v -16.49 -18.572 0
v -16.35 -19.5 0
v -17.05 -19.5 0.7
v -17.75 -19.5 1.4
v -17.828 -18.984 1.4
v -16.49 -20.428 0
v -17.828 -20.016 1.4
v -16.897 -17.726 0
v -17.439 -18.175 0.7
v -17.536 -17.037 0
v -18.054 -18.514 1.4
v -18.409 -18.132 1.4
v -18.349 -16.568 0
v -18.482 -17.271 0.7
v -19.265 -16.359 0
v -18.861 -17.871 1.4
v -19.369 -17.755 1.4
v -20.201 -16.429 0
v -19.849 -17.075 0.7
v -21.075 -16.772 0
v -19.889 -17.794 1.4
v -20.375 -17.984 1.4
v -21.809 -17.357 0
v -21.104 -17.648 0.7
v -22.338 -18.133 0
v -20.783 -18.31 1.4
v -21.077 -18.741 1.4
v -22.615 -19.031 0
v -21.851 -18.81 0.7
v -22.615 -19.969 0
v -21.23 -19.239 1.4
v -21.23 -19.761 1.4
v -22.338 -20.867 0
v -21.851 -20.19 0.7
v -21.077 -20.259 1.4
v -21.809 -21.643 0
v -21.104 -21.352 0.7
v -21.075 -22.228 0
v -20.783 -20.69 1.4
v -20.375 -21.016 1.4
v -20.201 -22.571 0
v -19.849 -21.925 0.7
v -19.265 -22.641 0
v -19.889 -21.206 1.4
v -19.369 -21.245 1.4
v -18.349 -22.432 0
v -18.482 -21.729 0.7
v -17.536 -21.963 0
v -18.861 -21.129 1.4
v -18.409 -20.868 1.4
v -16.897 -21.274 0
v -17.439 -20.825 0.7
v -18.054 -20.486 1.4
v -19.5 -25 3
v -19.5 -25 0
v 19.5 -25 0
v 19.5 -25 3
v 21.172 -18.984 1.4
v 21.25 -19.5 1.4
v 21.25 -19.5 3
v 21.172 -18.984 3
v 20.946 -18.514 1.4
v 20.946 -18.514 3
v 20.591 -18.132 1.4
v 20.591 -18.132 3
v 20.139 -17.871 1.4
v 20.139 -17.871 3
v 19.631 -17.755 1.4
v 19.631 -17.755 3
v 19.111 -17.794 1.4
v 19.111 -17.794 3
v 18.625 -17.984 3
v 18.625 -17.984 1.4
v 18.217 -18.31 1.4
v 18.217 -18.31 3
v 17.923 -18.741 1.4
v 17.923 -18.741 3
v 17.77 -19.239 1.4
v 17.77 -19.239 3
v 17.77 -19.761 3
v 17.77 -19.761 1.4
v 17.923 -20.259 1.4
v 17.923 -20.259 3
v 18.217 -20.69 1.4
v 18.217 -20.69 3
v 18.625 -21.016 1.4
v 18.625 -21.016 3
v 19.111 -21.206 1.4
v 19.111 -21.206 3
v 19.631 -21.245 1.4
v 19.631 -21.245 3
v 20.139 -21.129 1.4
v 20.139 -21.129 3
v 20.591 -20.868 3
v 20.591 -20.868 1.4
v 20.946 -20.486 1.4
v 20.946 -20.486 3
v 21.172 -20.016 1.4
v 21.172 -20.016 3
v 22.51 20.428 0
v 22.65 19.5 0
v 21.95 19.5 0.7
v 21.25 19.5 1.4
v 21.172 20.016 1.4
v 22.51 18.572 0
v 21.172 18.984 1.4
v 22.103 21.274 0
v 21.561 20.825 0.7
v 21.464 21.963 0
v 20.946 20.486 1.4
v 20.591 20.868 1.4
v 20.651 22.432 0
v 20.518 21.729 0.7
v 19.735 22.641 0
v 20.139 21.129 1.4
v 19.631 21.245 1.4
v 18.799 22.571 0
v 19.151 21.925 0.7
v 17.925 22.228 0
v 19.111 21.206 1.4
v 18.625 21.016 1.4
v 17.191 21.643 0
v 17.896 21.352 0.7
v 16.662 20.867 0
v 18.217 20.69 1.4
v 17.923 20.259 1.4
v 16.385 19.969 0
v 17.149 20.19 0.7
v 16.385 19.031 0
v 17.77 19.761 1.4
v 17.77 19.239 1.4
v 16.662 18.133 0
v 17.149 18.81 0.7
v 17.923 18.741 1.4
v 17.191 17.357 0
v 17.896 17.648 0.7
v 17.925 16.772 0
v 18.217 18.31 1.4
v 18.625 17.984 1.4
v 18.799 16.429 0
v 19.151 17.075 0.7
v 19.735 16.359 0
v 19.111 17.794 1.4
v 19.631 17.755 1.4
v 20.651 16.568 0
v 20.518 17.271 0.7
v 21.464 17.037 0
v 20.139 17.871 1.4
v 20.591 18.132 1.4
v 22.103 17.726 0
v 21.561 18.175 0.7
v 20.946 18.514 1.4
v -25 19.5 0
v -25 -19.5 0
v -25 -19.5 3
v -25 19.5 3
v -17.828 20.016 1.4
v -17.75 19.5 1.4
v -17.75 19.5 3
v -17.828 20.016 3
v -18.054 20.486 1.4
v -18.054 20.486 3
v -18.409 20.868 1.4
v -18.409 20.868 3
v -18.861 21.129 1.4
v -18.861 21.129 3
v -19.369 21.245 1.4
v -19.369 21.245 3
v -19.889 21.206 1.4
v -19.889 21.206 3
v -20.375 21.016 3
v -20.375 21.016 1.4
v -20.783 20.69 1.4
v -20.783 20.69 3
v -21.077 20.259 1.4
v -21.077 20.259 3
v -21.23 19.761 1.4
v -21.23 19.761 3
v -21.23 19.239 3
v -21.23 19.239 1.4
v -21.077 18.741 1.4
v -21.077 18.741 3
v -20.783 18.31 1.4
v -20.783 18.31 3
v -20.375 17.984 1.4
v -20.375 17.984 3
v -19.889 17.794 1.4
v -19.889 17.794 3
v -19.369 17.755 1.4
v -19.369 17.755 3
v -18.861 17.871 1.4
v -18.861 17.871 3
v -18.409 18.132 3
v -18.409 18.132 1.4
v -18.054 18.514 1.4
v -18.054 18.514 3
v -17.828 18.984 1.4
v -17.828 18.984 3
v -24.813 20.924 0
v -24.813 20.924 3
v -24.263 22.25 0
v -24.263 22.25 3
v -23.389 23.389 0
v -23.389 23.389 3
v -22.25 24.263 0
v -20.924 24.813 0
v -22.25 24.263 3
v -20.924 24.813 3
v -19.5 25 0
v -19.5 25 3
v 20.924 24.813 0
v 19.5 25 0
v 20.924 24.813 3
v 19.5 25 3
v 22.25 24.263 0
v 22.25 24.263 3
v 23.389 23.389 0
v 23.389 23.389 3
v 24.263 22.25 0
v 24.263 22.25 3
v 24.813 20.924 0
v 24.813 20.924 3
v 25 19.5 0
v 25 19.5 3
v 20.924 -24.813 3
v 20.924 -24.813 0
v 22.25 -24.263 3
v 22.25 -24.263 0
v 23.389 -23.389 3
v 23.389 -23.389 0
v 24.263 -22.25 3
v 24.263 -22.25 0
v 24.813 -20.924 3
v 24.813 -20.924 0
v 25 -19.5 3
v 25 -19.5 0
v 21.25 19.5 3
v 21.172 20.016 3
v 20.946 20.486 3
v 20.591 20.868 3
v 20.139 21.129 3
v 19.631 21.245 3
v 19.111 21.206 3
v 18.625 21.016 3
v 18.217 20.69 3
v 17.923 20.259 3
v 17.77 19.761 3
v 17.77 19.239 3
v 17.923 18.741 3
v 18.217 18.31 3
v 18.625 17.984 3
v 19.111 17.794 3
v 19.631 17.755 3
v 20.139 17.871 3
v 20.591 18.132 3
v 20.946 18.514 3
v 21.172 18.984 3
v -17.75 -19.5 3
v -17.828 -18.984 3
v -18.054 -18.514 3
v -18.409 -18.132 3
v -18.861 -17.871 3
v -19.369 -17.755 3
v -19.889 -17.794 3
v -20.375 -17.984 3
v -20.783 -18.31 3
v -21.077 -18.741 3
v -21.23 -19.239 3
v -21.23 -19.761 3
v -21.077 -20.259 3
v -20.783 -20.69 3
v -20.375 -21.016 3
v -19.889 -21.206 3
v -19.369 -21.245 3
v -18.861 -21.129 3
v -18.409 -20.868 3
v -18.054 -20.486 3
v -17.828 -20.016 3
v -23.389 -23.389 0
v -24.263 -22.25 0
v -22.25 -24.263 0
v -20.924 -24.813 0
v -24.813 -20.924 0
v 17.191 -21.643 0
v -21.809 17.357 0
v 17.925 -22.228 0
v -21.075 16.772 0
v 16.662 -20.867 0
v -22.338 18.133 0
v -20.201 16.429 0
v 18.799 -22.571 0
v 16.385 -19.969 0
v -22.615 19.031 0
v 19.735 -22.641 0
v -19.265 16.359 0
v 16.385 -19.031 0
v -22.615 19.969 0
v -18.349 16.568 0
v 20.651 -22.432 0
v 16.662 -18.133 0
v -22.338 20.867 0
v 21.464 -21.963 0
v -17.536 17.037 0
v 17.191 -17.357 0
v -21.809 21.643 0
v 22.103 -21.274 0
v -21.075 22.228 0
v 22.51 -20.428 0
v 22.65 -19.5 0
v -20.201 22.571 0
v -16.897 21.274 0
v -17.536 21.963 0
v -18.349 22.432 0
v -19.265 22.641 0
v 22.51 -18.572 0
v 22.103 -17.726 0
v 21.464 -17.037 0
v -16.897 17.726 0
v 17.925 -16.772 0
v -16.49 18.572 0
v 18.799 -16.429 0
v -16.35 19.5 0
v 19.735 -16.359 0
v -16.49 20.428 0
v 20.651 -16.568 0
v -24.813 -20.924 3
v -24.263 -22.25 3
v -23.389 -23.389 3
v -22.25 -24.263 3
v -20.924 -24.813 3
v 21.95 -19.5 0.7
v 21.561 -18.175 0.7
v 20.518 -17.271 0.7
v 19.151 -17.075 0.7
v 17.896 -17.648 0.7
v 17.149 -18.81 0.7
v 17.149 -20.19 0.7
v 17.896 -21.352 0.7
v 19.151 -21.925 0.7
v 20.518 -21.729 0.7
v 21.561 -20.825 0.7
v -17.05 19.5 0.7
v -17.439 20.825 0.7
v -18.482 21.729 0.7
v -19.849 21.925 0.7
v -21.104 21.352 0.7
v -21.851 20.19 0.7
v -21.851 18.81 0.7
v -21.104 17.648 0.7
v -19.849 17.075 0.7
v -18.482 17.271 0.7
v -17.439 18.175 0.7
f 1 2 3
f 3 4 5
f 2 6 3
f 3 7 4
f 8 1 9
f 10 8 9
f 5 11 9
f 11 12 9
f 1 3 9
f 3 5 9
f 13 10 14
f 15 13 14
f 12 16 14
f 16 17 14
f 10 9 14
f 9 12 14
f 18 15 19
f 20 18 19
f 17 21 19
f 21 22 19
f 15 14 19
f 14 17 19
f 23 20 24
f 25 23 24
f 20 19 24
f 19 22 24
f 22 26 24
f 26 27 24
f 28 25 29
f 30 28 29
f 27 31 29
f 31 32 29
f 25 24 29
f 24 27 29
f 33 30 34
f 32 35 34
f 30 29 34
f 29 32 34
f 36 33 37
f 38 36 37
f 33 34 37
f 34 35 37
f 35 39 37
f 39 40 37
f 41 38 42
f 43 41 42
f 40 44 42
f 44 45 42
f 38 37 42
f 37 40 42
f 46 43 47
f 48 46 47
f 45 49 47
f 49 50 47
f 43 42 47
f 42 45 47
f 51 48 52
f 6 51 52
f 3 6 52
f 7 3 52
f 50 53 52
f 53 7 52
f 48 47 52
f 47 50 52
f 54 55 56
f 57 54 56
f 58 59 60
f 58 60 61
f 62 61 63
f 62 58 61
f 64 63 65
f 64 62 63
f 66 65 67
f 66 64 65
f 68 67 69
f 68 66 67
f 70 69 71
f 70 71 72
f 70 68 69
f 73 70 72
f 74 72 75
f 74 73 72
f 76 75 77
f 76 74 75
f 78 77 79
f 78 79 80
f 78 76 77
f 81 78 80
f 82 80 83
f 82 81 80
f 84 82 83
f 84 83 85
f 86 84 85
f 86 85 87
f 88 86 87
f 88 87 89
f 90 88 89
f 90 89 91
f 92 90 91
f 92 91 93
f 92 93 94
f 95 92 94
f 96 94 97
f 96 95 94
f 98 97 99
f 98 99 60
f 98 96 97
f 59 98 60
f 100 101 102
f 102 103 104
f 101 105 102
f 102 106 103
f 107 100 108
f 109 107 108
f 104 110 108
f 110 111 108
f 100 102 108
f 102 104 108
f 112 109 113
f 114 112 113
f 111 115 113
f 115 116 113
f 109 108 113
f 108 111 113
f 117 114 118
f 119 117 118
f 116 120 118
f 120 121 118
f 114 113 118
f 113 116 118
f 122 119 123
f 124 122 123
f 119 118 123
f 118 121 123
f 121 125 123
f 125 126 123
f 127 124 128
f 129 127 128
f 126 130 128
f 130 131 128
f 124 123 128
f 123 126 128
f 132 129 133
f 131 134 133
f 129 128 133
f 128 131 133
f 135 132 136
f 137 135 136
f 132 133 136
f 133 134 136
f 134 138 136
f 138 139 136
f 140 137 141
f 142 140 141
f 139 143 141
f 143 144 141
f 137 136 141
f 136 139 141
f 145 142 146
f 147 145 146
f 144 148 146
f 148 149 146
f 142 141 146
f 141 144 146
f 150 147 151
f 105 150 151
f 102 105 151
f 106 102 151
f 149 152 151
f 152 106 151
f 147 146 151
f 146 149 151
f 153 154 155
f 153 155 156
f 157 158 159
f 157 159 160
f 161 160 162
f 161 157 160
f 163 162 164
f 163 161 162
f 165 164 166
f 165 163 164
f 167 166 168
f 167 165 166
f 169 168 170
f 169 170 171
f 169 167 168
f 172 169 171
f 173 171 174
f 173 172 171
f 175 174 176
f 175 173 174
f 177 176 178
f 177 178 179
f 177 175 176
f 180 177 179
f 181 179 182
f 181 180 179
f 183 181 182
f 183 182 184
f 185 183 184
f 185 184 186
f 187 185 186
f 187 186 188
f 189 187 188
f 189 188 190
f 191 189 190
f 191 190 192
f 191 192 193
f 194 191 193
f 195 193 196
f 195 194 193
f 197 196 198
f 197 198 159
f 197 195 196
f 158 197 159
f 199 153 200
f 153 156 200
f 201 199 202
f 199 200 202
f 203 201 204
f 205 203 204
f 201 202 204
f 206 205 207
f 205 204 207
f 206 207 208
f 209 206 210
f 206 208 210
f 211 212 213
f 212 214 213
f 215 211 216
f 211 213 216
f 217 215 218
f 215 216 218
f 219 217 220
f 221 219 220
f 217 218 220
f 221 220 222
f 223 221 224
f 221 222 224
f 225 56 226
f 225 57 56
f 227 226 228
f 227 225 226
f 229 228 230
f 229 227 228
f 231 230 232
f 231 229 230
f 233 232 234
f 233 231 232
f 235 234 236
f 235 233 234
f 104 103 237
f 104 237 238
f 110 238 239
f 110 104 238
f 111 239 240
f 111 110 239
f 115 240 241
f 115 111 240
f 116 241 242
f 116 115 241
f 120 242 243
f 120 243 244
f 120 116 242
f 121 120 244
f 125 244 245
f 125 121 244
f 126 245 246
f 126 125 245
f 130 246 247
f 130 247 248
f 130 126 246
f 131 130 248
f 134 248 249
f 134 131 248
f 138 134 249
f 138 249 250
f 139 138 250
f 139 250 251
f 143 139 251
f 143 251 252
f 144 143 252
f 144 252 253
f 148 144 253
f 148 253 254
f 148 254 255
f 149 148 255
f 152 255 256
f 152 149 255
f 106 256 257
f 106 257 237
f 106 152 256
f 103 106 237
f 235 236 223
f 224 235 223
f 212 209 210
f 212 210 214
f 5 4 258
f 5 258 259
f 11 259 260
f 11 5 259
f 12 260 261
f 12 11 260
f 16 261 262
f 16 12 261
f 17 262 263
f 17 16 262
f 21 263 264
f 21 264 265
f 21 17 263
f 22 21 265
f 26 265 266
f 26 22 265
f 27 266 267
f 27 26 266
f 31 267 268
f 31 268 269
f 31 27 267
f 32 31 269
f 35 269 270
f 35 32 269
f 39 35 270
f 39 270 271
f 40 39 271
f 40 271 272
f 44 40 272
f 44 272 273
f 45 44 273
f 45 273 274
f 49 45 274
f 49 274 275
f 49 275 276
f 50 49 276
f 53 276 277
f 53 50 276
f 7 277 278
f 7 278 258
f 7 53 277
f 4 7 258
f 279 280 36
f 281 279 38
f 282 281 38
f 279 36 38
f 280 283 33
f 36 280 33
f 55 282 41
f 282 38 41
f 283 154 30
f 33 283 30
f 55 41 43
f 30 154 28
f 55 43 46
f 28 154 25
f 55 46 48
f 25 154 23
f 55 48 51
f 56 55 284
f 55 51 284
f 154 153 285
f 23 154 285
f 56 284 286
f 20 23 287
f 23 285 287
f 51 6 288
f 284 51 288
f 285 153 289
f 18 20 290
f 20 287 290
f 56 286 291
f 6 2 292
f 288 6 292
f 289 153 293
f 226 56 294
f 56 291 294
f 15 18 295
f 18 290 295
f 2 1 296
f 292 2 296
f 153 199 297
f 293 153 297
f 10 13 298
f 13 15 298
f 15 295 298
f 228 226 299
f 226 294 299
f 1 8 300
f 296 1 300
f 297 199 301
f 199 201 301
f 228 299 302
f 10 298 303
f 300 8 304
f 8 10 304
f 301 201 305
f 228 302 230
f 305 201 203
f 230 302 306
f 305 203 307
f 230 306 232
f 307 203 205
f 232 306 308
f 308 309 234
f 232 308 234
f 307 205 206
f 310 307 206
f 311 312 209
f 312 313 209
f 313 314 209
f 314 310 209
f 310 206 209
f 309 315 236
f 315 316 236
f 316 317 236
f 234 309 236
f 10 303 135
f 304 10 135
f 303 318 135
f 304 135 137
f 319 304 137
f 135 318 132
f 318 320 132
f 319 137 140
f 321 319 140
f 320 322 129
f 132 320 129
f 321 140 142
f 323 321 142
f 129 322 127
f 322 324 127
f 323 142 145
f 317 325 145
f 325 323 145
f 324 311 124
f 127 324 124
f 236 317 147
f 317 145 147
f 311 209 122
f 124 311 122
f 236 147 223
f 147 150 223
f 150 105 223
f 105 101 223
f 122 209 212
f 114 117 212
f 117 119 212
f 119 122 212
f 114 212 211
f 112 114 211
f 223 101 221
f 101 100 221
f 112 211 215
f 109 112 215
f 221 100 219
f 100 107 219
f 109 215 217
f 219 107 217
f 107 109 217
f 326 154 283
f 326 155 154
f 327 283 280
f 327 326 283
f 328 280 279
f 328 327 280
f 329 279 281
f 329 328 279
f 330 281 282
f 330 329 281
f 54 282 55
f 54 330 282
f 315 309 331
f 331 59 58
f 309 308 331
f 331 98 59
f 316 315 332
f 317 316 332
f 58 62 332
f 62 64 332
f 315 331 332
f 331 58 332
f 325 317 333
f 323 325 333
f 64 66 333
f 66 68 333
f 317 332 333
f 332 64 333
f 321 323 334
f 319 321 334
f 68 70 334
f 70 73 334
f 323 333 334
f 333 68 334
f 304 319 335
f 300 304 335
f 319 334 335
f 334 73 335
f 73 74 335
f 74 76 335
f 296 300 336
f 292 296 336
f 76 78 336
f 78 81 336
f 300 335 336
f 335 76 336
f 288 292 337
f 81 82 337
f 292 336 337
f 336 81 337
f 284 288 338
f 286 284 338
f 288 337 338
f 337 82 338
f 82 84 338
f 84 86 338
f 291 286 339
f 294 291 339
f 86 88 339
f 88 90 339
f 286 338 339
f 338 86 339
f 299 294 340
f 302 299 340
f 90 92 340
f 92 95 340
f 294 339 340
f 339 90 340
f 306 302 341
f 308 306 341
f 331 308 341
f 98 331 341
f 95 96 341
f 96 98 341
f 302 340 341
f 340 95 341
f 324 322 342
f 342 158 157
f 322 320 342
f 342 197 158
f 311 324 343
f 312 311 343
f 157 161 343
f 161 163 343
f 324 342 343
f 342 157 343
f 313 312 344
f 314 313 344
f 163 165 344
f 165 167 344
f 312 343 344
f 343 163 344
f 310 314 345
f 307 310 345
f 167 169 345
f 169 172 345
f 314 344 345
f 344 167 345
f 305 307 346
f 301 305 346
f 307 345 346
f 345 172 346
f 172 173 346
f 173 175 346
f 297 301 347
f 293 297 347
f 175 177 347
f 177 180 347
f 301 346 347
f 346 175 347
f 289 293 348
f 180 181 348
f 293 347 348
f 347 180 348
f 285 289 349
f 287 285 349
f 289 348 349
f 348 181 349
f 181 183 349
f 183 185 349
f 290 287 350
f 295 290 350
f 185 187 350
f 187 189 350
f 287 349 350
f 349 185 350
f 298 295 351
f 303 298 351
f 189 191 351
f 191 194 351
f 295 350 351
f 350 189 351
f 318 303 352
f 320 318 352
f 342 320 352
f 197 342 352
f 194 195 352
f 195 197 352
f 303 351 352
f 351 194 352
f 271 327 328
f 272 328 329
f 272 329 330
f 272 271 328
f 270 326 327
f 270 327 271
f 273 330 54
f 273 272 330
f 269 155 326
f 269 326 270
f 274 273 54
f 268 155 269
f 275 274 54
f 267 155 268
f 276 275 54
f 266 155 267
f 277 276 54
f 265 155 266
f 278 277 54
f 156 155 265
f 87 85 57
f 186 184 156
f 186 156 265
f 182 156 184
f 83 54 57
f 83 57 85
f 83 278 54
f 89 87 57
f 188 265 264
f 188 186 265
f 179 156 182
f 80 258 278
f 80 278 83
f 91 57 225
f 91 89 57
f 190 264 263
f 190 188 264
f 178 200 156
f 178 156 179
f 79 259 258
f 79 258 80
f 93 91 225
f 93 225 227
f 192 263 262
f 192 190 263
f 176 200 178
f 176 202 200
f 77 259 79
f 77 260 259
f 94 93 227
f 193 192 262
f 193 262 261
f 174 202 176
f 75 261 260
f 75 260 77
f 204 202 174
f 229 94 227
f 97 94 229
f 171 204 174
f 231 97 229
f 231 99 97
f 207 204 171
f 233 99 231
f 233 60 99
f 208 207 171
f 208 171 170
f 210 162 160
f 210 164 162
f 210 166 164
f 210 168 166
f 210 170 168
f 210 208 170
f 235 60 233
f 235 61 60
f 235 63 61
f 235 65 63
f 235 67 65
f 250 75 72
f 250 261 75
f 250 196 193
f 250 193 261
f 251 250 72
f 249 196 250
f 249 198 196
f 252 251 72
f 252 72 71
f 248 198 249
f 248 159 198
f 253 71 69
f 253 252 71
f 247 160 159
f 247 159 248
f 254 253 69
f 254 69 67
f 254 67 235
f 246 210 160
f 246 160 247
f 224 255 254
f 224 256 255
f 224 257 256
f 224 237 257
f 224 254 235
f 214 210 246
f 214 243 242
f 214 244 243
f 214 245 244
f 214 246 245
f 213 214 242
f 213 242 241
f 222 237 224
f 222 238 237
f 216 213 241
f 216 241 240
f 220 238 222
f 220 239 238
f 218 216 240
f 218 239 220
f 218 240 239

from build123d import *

# Parameters (mm, degrees)
F0_W     = 50
F0_H     = 50
F0_R     = 1.75
F1_DEPTH = 3
F2_R     = 5.5
F3_SIZE  = 1.4


with BuildPart() as f1:
    # F0 (on Top) → F1 (new body)
    with BuildSketch(Plane.XY):
        Rectangle(F0_W, F0_H)
        with Locations((-19.5, -19.5)):
            Circle(F0_R, mode=Mode.SUBTRACT)
        with Locations((19.5, -19.5)):
            Circle(F0_R, mode=Mode.SUBTRACT)
        with Locations((-19.5, 19.5)):
            Circle(F0_R, mode=Mode.SUBTRACT)
        with Locations((19.5, 19.5)):
            Circle(F0_R, mode=Mode.SUBTRACT)
    extrude(amount=F1_DEPTH)

    # F2
    f2_edges = [f1.edges().sort_by_distance(p)[0] for p in [
        (-25, -25, 1.5),
        (25, -25, 1.5),
        (25, 25, 1.5),
        (-25, 25, 1.5),
    ]]
    fillet(f2_edges, radius=F2_R)

    # F3
    f3_edges = [f1.edges().sort_by_distance(p)[0] for p in [
        (-21.25, -19.5, 0),
        (-21.25, 19.5, 0),
        (17.75, 19.5, 0),
        (17.75, -19.5, 0),
    ]]
    chamfer(f3_edges, length=F3_SIZE)


solid = f1.part
